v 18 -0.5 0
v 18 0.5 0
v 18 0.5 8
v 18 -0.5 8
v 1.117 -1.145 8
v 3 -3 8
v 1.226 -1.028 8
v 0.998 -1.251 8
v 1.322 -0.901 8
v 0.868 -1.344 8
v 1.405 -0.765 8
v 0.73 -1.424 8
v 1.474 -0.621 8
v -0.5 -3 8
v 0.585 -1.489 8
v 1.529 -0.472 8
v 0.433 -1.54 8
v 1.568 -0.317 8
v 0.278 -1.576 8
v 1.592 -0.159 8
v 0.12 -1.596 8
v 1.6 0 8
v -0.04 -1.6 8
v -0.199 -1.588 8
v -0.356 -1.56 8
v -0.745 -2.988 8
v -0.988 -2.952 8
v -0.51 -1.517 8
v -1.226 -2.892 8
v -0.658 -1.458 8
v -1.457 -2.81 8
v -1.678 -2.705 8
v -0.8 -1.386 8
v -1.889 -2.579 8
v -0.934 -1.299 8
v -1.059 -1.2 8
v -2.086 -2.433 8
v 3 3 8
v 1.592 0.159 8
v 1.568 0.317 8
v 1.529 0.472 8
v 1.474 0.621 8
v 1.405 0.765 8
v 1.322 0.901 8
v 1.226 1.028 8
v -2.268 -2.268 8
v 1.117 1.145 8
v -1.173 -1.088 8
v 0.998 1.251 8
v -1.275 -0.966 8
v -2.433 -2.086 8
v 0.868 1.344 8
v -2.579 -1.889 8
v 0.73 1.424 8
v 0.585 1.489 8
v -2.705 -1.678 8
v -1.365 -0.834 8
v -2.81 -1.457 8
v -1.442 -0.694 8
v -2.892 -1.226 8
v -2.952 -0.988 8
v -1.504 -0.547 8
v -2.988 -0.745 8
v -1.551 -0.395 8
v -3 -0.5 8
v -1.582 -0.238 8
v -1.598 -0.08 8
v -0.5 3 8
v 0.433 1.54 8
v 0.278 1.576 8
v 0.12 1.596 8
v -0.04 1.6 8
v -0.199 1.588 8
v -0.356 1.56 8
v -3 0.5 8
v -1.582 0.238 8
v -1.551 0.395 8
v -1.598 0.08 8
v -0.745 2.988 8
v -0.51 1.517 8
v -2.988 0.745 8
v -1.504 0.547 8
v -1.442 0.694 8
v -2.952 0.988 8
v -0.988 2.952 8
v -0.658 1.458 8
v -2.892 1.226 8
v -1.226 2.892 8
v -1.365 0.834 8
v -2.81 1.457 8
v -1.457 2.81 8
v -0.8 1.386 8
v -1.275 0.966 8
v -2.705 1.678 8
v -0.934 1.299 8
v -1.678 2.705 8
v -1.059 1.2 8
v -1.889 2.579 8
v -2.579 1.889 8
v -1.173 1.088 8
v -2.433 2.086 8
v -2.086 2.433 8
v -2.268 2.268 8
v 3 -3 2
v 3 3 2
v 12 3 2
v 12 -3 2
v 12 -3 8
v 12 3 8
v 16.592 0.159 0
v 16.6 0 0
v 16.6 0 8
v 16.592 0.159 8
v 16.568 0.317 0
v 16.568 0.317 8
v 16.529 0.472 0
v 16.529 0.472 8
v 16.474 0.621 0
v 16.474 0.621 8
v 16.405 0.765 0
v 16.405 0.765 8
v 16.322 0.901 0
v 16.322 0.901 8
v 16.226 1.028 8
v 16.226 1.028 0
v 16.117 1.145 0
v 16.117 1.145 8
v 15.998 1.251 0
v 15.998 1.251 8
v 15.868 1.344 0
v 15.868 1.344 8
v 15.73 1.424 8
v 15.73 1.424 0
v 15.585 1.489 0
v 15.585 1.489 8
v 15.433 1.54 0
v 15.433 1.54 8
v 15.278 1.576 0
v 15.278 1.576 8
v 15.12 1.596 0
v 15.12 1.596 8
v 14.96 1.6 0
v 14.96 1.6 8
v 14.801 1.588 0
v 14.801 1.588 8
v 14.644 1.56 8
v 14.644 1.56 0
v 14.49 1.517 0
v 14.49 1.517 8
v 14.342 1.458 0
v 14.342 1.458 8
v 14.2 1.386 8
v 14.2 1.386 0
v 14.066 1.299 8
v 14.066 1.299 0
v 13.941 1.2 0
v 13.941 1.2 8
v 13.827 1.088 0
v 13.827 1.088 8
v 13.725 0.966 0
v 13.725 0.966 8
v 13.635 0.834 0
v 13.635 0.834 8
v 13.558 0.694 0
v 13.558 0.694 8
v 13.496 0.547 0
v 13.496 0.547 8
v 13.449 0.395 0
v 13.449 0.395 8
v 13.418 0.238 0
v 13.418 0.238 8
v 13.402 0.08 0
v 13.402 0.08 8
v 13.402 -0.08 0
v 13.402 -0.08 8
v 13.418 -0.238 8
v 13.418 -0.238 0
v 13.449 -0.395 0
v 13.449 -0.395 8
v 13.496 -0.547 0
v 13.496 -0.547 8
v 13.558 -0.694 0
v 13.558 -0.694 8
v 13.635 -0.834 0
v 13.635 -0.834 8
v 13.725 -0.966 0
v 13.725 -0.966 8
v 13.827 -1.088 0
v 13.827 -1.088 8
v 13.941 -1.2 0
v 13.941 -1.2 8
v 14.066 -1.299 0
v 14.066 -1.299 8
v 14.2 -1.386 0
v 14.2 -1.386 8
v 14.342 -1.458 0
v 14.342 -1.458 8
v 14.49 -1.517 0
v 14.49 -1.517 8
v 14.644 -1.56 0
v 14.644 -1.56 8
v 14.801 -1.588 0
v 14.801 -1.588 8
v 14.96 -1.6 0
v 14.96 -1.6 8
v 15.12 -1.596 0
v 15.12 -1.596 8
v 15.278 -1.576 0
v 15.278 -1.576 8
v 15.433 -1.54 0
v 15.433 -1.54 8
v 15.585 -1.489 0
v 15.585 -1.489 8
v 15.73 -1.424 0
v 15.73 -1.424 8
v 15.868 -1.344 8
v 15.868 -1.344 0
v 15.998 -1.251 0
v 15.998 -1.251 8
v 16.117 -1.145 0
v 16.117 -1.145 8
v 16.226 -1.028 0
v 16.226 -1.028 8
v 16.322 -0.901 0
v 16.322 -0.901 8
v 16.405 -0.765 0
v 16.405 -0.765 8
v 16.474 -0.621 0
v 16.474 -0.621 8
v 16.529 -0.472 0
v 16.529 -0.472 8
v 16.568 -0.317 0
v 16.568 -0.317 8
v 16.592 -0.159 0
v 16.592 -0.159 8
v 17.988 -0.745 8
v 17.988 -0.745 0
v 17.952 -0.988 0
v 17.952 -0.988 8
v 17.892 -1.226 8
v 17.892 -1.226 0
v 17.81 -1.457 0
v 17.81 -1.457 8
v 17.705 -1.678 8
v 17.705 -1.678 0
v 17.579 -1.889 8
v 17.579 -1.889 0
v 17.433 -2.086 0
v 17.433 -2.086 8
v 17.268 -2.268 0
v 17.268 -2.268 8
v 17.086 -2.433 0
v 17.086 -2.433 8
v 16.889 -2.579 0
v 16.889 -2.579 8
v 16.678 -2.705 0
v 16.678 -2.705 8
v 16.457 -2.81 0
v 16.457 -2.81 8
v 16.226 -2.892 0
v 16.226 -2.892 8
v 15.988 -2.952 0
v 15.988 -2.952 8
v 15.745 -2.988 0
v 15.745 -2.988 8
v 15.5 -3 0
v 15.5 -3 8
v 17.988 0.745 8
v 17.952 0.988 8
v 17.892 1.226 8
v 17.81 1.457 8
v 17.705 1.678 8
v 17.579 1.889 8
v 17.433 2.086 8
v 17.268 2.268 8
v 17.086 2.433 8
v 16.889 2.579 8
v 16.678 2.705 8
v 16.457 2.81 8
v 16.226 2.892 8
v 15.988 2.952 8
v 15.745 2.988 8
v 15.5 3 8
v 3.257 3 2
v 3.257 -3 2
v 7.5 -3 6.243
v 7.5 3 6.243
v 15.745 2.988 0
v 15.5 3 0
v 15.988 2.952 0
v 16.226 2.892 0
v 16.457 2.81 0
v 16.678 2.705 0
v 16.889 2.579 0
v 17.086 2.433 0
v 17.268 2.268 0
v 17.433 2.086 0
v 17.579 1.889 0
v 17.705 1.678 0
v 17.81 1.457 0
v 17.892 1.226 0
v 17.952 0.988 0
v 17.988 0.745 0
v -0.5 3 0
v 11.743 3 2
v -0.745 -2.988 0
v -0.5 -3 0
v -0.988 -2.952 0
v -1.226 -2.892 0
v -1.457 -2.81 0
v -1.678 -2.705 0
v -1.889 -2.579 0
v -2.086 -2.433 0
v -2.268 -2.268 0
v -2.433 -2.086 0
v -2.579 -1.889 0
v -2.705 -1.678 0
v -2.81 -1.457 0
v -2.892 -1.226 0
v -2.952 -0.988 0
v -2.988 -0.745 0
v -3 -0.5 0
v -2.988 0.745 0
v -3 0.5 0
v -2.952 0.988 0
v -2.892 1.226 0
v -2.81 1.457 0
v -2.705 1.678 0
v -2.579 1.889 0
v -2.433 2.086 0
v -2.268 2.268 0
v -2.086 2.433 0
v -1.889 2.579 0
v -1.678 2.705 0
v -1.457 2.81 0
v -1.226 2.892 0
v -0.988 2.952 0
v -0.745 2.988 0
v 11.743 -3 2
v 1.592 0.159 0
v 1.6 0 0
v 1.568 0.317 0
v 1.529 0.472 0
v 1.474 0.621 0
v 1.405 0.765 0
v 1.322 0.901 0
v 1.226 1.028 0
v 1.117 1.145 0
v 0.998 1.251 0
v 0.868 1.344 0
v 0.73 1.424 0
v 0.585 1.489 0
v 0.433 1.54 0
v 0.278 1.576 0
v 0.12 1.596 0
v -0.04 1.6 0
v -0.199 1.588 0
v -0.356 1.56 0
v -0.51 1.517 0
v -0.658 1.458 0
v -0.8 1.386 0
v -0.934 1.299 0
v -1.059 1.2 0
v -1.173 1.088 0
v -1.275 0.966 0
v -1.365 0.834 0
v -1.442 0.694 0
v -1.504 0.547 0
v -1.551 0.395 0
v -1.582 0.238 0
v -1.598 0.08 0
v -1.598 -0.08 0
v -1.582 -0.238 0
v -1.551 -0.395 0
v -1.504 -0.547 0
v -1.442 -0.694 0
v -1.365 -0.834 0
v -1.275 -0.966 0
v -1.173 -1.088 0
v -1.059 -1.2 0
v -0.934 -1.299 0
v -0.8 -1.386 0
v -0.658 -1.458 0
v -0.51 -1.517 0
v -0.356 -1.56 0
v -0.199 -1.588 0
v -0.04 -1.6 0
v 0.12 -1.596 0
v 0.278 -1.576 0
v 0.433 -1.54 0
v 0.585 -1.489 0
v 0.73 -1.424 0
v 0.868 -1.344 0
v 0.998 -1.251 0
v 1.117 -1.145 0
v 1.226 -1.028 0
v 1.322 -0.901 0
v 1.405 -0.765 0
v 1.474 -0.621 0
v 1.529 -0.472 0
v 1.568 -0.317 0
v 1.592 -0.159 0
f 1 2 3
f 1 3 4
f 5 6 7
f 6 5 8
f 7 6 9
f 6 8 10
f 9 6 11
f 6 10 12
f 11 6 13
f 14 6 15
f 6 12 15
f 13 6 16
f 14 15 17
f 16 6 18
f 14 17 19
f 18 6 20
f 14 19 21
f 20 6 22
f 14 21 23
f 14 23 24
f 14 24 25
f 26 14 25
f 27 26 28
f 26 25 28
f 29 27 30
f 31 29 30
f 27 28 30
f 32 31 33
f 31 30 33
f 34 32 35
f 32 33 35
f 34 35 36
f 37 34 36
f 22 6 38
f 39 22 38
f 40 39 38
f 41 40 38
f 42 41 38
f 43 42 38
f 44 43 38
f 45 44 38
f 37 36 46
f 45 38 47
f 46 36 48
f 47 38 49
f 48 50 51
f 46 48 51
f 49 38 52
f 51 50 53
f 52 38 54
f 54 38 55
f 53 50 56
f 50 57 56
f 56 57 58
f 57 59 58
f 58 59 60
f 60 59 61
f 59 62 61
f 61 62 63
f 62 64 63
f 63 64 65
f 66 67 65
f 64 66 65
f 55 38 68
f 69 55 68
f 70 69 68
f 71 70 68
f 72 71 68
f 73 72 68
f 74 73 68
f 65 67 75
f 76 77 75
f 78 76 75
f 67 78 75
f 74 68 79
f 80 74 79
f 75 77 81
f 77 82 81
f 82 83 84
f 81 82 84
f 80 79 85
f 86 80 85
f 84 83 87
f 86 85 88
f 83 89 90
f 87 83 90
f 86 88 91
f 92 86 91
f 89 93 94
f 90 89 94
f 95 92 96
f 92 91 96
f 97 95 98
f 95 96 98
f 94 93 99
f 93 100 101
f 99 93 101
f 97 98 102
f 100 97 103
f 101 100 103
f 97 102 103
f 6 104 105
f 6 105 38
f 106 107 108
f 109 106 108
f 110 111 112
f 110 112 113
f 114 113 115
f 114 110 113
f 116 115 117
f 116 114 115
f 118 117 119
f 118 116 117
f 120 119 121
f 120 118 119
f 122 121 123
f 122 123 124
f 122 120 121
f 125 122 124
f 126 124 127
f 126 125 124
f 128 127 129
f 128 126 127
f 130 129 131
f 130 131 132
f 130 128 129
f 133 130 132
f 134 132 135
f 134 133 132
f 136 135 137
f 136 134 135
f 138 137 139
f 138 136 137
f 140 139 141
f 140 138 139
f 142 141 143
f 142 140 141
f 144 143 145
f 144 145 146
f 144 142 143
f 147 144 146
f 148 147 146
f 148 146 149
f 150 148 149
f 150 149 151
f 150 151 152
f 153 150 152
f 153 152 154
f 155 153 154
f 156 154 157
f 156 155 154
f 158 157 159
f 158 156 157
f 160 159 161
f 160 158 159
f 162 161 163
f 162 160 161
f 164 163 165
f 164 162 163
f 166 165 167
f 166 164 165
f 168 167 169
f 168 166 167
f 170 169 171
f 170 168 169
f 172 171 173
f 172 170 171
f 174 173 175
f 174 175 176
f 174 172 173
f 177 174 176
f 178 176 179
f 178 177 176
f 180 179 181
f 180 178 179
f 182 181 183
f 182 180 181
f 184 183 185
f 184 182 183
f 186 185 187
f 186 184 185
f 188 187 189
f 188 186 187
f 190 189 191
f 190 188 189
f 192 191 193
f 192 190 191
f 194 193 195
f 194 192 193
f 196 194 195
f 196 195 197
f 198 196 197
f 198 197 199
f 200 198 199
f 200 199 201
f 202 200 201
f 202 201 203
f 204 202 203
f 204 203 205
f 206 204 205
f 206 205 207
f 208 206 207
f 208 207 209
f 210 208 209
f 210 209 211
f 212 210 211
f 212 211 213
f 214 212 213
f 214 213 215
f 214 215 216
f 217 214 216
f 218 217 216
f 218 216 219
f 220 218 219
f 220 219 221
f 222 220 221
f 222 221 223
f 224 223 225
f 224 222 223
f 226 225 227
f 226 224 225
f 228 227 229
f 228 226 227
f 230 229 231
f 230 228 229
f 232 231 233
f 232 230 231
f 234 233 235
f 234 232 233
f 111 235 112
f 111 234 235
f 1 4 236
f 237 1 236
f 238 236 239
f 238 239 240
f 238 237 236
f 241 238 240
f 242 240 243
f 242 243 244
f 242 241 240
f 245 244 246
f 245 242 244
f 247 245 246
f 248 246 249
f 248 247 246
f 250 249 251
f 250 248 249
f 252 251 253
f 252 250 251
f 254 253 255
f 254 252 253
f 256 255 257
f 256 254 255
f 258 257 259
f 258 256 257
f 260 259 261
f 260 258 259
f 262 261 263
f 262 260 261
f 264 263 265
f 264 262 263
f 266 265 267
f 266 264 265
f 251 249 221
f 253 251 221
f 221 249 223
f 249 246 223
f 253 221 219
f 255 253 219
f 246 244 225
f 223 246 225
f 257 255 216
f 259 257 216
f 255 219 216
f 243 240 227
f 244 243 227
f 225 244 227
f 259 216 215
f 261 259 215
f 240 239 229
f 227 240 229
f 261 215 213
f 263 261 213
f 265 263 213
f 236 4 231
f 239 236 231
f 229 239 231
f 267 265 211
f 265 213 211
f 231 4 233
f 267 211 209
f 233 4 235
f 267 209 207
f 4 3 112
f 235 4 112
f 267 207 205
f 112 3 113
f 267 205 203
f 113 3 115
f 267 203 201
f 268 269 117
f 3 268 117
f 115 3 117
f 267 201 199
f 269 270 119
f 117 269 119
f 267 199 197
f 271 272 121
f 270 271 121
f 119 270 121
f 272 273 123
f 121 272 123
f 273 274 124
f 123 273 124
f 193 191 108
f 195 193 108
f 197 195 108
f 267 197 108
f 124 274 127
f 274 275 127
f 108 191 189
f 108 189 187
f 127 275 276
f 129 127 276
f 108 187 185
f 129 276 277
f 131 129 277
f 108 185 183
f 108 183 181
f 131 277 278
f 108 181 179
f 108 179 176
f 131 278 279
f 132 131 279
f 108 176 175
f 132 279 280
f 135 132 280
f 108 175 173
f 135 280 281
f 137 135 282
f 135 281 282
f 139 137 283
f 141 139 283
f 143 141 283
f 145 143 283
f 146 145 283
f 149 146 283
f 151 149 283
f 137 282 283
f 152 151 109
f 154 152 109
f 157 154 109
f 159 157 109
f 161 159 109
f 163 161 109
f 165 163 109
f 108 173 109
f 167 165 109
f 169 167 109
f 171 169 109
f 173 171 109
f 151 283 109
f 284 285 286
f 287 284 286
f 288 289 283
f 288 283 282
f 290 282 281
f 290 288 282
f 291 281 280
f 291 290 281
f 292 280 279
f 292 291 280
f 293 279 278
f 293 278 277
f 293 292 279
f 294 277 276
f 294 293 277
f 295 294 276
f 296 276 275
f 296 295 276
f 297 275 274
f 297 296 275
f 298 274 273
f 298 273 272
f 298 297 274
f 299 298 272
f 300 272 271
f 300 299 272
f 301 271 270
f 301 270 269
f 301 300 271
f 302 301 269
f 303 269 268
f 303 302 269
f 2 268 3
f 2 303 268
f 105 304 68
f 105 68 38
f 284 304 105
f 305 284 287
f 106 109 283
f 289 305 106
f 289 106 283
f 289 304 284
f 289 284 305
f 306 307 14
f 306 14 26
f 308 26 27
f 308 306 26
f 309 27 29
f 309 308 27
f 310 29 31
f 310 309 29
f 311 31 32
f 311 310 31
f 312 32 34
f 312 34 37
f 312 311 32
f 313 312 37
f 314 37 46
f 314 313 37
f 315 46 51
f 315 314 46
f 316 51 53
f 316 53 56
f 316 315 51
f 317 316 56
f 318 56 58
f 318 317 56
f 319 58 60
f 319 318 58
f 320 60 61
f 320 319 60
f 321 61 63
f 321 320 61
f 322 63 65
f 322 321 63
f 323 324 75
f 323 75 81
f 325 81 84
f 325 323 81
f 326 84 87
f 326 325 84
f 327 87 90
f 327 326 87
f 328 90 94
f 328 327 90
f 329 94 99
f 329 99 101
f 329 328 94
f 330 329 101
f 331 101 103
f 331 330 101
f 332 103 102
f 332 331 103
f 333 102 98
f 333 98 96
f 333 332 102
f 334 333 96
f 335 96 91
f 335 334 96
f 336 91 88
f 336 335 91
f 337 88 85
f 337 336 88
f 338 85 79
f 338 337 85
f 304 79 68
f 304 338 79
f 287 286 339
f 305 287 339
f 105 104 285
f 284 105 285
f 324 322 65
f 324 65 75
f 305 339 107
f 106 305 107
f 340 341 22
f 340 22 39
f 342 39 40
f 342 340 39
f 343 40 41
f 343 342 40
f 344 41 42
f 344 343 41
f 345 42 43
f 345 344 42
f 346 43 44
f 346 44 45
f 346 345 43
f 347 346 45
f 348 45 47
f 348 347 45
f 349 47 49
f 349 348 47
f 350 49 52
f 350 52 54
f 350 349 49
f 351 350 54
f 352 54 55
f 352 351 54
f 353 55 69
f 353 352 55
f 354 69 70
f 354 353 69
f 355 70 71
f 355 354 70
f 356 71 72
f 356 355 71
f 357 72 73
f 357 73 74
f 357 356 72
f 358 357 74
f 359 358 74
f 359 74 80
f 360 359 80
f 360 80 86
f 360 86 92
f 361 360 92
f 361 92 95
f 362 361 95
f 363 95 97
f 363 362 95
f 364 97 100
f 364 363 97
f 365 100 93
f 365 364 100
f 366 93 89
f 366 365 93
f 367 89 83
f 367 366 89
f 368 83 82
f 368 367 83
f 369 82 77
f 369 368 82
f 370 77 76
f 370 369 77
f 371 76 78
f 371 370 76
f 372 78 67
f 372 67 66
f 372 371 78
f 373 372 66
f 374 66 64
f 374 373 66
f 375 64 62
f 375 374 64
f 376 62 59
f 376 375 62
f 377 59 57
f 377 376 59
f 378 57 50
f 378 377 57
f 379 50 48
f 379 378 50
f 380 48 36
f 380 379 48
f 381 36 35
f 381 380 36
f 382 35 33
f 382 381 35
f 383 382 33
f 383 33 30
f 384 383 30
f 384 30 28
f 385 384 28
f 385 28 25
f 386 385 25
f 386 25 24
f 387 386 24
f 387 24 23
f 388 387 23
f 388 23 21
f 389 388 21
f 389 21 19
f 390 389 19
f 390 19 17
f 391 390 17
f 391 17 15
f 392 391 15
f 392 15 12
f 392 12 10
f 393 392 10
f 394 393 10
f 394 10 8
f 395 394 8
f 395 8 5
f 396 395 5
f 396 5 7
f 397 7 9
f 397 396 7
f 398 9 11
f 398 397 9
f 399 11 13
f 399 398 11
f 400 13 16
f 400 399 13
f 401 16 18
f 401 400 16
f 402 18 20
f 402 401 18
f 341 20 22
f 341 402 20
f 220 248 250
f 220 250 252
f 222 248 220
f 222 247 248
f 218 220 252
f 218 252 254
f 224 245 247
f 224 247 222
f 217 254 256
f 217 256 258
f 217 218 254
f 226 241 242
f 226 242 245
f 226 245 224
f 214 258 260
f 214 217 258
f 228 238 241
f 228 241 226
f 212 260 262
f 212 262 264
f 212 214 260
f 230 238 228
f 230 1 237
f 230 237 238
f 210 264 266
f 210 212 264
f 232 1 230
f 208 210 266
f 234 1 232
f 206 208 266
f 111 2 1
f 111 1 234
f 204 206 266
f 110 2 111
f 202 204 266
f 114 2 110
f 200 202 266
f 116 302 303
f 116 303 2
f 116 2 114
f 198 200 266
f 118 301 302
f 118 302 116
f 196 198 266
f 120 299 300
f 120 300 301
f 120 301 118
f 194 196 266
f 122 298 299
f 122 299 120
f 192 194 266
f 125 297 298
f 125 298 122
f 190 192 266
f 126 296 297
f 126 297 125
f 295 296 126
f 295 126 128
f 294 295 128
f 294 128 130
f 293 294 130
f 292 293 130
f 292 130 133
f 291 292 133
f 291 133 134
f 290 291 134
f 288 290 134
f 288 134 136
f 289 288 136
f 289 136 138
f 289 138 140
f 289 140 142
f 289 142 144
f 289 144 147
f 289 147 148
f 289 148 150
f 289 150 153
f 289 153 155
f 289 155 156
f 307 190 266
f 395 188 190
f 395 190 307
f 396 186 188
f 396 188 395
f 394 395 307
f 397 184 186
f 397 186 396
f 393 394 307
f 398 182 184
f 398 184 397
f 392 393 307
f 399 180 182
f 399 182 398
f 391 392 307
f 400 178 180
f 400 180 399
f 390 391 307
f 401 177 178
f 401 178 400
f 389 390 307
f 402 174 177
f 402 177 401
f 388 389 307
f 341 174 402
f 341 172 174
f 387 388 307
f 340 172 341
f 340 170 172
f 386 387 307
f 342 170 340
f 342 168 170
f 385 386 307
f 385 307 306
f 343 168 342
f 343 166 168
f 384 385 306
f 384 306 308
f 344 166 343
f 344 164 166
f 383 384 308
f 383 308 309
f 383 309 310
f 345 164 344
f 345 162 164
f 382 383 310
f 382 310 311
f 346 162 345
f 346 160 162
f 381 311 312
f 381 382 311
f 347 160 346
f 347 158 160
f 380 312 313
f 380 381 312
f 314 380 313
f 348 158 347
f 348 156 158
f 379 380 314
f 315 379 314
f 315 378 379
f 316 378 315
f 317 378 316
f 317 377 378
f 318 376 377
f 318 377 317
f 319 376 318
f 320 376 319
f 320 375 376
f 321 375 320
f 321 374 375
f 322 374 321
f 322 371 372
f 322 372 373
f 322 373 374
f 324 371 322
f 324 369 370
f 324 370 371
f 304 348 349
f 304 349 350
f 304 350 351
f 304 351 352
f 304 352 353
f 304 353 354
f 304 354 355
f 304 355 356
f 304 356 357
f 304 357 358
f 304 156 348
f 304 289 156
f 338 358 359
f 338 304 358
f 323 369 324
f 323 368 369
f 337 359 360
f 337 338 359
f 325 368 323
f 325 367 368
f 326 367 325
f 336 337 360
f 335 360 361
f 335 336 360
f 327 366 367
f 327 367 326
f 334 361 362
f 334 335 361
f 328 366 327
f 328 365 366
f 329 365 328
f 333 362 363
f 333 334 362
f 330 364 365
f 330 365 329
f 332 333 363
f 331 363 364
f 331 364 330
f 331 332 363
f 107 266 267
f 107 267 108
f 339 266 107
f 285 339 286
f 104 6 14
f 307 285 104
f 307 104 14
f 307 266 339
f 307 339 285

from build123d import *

# Parameters (mm, degrees)
SKETCH1_R           = 1.6
BOSS_EXTRUDE1_DEPTH = 8
SKETCH2_W           = 9
SKETCH2_H           = 8.199711987
CUT_EXTRUDE1_DEPTH  = 8
BOSS_EXTRUDE2_DEPTH = 6


with BuildPart() as part:
    # Sketch1 → Boss-Extrude1 (new body)
    with BuildSketch(Plane.XY):
        with BuildLine():
            Line((-0.5, 3), (15.5, 3))
            ThreePointArc((15.5, 3), (17.267766953, 2.267766953), (18, 0.5))
            Line((18, 0.5), (18, -0.5))
            ThreePointArc((18, -0.5), (17.267766953, -2.267766953), (15.5, -3))
            Line((15.5, -3), (-0.5, -3))
            ThreePointArc((-0.5, -3), (-2.267766953, -2.267766953), (-3, -0.5))
            Line((-3, -0.5), (-3, 0.5))
            ThreePointArc((-3, 0.5), (-2.267766953, 2.267766953), (-0.5, 3))
        make_face()
        Circle(SKETCH1_R, mode=Mode.SUBTRACT)
        with Locations((15, 0)):
            Circle(SKETCH1_R, mode=Mode.SUBTRACT)
    extrude(amount=BOSS_EXTRUDE1_DEPTH)

    # Sketch2 → Cut-Extrude1 (cut)
    with BuildSketch(Plane.XZ.offset(3)):
        with Locations((7.5, 6.099855994)):
            Rectangle(SKETCH2_W, SKETCH2_H)
    extrude(amount=-CUT_EXTRUDE1_DEPTH, mode=Mode.SUBTRACT)

    # Sketch3 → Boss-Extrude2 (add)
    with BuildSketch(Plane.XZ.offset(3)):
        Polygon((3.257359313, 2), (7.5, 6.242640687), (11.742640687, 2), align=None)
    extrude(amount=-BOSS_EXTRUDE2_DEPTH)


solid = part.part
